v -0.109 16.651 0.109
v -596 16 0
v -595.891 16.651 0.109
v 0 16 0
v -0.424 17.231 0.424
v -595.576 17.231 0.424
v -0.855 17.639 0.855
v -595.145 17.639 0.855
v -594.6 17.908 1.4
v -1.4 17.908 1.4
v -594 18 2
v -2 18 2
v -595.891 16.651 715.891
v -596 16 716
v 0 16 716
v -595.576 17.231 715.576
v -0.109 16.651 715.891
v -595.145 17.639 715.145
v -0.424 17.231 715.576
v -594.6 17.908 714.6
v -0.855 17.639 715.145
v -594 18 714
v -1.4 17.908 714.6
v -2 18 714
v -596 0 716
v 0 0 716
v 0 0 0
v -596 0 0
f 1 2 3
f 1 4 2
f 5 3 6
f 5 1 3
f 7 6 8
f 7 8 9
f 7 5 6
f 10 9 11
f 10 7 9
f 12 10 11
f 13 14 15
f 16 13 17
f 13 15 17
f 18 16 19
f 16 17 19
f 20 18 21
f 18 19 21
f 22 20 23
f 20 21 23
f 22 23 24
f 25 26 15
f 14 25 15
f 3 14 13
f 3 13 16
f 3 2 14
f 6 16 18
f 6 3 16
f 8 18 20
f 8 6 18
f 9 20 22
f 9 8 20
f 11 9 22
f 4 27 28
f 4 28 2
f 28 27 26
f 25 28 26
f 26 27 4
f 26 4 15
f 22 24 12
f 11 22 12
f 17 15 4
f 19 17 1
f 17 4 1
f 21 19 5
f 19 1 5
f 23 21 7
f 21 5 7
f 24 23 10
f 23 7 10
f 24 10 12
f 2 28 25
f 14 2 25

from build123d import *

# Parameters (mm, degrees)
F0_W     = 39.6928340197
F0_H     = 31.0325622559
F1_DEPTH = 18
F2_DEPTH = 716
F3_DEPTH = 596
F4_R     = 2


with BuildPart() as f1:
    # F0 (on Front) → F1 (new body)
    with BuildSketch(Plane.XZ):
        with Locations((-19.8464170098, 15.5162811279)):
            Rectangle(F0_W, F0_H)
    extrude(amount=-F1_DEPTH)

    # F2 (add): a face of the model
    f2_faces = [f1.faces().sort_by_distance(p)[0] for p in [
        (-19.8464170098, 9, 0),
    ]]
    extrude(f2_faces, amount=-F2_DEPTH)

    # F3 (add): a face of the model
    f3_faces = [f1.faces().sort_by_distance(p)[0] for p in [
        (0, 9, 358),
    ]]
    extrude(f3_faces, amount=-F3_DEPTH)

    # F4
    f4_edges = [f1.edges().sort_by_distance(p)[0] for p in [
        (0, 18, 358),
        (-298, 18, 716),
        (-596, 18, 358),
        (-298, 18, 0),
    ]]
    fillet(f4_edges, radius=F4_R)


solid = f1.part
